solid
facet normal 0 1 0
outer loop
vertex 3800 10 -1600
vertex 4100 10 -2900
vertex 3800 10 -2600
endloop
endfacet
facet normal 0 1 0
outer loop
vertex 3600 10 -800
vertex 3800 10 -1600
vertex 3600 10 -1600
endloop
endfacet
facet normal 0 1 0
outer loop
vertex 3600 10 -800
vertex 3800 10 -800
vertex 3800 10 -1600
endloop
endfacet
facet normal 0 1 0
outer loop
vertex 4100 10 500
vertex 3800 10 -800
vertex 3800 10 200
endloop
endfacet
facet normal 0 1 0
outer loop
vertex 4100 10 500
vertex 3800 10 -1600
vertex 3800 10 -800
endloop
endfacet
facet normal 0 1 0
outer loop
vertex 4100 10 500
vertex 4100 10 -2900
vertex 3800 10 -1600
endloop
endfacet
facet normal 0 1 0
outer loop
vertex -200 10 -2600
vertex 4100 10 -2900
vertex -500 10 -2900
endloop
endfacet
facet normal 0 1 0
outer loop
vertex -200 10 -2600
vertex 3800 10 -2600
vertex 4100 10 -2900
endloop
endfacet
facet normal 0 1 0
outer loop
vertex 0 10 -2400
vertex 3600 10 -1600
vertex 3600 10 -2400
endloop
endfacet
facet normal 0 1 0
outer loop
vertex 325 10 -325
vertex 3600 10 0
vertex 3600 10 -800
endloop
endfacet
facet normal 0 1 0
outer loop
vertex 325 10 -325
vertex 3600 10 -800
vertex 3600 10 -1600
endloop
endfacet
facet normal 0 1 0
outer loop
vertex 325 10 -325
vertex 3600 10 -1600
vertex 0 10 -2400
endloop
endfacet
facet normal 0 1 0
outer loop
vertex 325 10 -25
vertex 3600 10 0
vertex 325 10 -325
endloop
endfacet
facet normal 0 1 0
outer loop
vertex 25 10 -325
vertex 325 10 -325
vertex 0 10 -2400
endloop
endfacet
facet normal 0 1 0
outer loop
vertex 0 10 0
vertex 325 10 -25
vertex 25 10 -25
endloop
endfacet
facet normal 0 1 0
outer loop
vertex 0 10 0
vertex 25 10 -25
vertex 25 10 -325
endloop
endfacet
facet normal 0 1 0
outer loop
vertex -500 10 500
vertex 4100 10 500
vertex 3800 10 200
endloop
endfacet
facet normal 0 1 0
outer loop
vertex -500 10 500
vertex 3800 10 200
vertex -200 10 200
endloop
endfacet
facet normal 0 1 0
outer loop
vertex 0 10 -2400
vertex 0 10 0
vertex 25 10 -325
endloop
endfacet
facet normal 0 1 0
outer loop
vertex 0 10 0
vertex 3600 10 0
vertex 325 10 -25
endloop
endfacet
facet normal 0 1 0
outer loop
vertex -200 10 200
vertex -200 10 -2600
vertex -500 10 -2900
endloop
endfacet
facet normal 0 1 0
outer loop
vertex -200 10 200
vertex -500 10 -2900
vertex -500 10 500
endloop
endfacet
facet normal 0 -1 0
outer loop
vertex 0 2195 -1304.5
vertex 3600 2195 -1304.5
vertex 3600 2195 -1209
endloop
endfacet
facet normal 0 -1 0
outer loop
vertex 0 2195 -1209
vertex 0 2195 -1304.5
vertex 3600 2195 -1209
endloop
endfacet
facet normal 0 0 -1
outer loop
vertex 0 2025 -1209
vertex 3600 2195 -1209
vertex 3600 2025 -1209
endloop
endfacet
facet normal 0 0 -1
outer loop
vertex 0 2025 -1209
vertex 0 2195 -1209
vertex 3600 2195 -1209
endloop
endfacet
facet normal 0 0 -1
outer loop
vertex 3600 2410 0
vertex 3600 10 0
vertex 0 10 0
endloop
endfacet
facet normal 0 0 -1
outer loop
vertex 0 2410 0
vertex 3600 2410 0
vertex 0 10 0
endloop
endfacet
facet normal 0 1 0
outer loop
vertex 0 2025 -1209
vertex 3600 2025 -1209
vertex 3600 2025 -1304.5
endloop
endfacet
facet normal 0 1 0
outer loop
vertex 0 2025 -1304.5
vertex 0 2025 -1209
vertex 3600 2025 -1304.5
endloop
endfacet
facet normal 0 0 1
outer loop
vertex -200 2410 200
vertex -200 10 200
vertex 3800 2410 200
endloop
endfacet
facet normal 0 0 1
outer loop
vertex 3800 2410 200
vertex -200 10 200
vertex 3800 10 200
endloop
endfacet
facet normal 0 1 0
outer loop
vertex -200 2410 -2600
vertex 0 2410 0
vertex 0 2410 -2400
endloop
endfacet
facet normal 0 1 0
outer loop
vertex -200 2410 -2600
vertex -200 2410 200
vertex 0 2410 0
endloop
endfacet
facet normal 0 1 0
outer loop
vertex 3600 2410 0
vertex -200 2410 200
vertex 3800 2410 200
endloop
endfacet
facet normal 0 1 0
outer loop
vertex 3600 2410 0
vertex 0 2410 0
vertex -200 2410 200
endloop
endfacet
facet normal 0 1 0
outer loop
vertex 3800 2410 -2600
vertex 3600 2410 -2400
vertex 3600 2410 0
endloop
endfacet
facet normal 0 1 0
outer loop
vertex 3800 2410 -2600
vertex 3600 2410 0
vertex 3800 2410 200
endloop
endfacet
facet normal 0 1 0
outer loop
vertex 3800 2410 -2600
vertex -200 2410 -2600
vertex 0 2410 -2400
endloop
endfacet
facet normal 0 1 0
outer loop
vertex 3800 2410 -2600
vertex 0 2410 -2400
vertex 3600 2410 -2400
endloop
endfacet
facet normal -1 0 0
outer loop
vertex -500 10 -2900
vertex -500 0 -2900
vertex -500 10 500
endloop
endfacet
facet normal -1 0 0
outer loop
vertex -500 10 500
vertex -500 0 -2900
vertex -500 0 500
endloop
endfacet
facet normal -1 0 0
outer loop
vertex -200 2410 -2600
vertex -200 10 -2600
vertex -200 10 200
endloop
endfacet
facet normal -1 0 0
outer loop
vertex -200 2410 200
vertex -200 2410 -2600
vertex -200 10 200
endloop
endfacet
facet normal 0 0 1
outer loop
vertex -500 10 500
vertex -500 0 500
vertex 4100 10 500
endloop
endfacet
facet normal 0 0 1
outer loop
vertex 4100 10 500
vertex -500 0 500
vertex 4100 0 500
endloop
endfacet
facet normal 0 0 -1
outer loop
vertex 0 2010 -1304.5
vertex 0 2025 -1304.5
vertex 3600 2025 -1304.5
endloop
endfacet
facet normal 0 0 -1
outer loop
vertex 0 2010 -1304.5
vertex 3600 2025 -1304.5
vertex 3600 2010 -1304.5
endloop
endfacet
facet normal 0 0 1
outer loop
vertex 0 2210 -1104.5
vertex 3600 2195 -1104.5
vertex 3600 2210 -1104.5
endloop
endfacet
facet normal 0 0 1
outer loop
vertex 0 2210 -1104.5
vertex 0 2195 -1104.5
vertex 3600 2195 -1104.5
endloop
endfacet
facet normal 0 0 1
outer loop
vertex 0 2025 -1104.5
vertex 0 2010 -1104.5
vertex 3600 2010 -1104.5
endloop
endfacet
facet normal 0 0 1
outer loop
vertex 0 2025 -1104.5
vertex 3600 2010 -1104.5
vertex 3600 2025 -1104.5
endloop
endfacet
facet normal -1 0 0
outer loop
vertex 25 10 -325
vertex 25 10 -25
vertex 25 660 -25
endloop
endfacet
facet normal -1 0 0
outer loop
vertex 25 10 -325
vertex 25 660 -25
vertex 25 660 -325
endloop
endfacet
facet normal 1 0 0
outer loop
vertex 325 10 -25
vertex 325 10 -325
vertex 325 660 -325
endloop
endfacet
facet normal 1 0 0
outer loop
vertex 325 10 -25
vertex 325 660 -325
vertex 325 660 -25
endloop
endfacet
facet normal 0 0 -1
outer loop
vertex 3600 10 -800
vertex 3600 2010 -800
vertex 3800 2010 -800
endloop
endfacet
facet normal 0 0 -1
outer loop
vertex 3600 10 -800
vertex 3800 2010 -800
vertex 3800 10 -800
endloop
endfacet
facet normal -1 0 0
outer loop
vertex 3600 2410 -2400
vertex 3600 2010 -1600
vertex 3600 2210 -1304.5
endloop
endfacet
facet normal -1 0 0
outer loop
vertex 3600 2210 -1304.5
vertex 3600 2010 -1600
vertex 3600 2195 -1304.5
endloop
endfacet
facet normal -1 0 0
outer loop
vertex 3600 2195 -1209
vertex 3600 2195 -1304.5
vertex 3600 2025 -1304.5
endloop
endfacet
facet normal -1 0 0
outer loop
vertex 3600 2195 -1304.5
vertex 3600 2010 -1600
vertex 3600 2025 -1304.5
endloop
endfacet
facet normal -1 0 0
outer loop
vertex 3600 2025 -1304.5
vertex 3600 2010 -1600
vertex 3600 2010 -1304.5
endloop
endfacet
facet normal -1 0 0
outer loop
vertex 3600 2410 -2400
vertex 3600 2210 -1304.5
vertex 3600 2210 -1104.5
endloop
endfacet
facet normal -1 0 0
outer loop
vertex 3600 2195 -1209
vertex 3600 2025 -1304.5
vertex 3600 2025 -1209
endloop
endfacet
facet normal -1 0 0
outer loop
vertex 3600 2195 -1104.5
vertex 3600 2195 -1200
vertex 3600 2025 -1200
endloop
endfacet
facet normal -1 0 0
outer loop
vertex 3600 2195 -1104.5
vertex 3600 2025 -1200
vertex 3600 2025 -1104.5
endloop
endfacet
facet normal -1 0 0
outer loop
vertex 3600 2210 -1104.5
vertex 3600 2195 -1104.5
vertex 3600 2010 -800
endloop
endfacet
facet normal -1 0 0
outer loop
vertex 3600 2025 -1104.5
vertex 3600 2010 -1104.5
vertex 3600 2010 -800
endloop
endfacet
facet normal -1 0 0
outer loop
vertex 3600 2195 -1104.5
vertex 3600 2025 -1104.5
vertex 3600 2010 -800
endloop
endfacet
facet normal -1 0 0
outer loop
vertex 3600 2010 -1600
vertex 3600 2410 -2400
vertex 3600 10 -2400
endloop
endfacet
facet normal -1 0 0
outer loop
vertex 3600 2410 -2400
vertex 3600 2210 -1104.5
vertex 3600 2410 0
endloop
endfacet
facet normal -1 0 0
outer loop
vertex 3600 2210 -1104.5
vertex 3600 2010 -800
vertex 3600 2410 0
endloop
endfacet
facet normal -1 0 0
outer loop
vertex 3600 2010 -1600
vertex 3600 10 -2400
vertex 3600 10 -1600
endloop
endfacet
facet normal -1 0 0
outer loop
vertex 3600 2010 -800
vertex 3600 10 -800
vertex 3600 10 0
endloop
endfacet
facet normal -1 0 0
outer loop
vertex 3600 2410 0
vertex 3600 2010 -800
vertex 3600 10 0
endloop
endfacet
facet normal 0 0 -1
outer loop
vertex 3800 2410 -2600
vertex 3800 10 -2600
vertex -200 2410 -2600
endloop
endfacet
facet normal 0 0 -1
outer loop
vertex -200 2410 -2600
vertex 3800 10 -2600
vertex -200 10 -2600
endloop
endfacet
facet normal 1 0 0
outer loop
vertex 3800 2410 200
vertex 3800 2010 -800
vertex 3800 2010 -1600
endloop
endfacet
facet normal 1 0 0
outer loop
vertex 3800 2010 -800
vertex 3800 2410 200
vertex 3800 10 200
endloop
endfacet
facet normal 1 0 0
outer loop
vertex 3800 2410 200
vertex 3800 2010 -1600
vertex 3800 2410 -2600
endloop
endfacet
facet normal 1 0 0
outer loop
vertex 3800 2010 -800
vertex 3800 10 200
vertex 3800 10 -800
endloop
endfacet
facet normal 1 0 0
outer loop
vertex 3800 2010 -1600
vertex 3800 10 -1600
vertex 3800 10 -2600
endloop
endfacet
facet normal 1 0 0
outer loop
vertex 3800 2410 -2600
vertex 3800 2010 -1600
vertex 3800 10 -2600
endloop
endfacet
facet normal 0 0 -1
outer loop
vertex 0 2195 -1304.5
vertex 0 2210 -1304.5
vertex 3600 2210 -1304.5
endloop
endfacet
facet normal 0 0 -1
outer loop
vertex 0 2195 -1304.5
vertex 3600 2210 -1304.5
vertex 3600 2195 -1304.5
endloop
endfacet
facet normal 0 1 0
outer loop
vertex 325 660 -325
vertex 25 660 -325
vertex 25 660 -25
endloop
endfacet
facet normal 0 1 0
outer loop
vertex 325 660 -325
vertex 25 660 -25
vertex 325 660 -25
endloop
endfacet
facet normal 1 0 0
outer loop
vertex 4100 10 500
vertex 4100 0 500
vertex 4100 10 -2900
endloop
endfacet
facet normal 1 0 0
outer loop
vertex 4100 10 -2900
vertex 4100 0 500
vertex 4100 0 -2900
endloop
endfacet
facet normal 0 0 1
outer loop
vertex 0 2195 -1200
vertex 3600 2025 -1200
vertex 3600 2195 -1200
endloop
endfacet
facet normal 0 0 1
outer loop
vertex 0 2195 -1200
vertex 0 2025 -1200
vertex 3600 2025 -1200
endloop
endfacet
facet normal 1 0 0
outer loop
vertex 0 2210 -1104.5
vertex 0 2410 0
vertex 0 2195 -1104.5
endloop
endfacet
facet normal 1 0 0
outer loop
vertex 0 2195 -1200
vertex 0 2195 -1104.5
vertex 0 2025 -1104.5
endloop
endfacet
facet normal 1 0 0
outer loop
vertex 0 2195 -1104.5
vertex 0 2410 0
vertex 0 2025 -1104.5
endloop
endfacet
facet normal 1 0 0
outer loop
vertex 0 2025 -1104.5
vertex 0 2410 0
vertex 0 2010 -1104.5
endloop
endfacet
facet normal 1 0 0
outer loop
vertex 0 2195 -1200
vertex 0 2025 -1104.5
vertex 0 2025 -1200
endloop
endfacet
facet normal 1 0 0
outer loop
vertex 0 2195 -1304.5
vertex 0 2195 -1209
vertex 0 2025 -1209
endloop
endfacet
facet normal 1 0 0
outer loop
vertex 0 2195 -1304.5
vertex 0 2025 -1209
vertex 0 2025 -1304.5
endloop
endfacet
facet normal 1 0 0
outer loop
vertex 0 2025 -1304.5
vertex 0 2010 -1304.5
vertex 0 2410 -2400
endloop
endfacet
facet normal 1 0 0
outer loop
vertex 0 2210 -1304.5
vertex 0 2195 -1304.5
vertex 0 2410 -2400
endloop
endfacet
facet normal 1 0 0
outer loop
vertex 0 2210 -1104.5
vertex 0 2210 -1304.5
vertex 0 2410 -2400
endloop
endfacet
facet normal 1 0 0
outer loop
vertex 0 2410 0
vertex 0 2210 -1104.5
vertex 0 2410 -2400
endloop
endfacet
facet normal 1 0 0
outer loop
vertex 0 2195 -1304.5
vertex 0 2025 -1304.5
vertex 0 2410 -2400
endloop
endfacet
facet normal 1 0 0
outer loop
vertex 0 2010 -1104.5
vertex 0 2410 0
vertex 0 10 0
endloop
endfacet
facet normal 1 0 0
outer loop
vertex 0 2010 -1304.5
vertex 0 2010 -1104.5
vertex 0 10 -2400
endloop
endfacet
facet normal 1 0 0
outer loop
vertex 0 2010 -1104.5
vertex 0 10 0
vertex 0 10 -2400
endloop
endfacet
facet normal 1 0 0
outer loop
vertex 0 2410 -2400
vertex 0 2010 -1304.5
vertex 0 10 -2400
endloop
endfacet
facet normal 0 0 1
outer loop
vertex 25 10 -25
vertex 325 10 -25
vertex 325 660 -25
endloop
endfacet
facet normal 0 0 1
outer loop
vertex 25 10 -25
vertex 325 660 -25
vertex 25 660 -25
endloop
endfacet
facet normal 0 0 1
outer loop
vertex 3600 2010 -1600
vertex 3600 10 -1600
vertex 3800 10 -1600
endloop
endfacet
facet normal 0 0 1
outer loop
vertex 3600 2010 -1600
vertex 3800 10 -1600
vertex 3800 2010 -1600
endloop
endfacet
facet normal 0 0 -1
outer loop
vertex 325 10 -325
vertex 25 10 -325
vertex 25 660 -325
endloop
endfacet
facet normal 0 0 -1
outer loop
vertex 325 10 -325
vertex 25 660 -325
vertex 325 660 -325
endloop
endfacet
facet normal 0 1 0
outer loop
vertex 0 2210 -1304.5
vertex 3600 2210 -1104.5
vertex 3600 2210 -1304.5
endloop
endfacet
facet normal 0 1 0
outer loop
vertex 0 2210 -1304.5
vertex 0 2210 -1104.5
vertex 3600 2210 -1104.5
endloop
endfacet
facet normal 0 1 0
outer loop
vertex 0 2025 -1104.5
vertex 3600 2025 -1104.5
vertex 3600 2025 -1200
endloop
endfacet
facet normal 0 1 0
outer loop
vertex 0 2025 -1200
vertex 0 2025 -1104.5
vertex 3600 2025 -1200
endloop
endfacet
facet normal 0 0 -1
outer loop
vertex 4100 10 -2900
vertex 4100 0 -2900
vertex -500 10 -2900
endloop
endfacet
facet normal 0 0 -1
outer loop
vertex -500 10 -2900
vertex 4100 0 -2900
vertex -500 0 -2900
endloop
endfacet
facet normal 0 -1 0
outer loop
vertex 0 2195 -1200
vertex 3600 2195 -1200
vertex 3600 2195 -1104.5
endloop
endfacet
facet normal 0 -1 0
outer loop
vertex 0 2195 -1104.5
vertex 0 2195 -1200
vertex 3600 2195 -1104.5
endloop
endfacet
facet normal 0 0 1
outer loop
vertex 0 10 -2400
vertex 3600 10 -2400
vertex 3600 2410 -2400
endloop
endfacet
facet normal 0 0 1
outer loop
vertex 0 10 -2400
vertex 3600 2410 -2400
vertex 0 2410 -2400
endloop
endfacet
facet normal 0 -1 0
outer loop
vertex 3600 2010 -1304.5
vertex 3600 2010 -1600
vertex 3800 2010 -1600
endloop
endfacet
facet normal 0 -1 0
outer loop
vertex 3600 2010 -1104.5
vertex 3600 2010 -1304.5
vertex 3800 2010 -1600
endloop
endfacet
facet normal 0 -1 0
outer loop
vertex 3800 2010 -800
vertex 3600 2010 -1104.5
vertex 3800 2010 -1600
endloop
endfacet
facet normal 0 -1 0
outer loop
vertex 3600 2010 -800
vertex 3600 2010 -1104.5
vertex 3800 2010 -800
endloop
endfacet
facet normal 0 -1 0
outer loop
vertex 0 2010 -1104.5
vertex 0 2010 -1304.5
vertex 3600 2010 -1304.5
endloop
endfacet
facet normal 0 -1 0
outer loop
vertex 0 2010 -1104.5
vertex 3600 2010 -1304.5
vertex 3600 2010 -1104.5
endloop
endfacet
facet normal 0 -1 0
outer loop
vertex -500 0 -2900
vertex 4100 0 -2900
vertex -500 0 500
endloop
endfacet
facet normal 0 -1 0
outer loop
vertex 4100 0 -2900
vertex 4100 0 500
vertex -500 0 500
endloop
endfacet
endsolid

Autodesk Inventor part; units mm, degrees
ref_plane "YZ Plane" through (0, 0, 0) normal (1, 0, 0) x (0, 1, 0)
ref_plane "XZ Plane" through (0, 0, 0) normal (0, 1, 0) x (-1, 0, 0)
ref_plane "XY Plane" through (0, 0, 0) normal (0, 0, 1) x (1, 0, 0)
sketch "Sketch1" plane through (0, 0, 0) normal (0, 1, 0) x (-1, 0, 0)
  line L0 (500, 500) -> (-4100, 500)
  line L1 (-4100, 500) -> (-4100, -2900)
  line L2 (-4100, -2900) -> (500, -2900)
  line L3 (500, -2900) -> (500, 500)
  point P0 (0, 0)
  dimension "d0" = 4600
  dimension "d1" = 500
  dimension "d2" = 500
  dimension "d3" = 3400
extrude "Extrusion1" add sketch "Sketch1" along normal blind 10
sketch "Sketch2" plane through (0, 10, 0) normal (0, 1, 0) x (1, 0, 0)
  line L0 (-500, -500) -> (4100, -500) projected
  line L1 (-500, 2900) -> (-500, -500) projected
  line L2 (-200, -200) -> (0, -200)
  line L3 (0, -200) -> (0, 2600)
  line L4 (0, 2600) -> (-200, 2600)
  line L5 (-200, 2600) -> (-200, -200)
  point P0 (0, 0)
  dimension "d6" = 300
  dimension "d7" = 2800
  dimension "d8" = 200
  dimension "d9" = 300
extrude "Extrusion2" add sketch "Sketch2" along normal blind 2400
sketch "Sketch3" plane through (0, 10, 0) normal (0, 1, 0) x (1, 0, 0)
  line L0 (0, 2600) -> (0, -200) projected
  line L1 (-500, -500) -> (4100, -500) projected
  line L2 (0, -200) -> (3600, -200)
  line L3 (3600, -200) -> (3600, 0)
  line L4 (3600, 0) -> (0, 0)
  line L5 (0, 0) -> (0, -200)
  point P0 (0, 0)
  dimension "d12" = 300
  dimension "d13" = 200
  dimension "d14" = 3600
extrude "Extrusion3" add sketch "Sketch3" along normal blind 2400
sketch "Sketch4" plane through (0, 10, 0) normal (0, 1, 0) x (1, 0, 0)
  line L0 (4100, 2900) -> (-500, 2900) projected
  line L1 (0, 2600) -> (0, 0) projected
  line L2 (0, 2600) -> (3600, 2600)
  line L3 (3600, 2600) -> (3600, 2400)
  line L4 (3600, 2400) -> (0, 2400)
  line L5 (0, 2400) -> (0, 2600)
  dimension "d17" = 300
  dimension "d18" = 200
  dimension "d19" = 3600
extrude "Extrusion4" add sketch "Sketch4" along normal blind 2400
sketch "Sketch5" plane through (0, 10, 0) normal (0, 1, 0) x (1, 0, 0)
  line L0 (3600, -200) -> (3800, -200)
  line L1 (3800, -200) -> (3800, 2600)
  line L2 (3800, 2600) -> (3600, 2600)
  line L3 (3600, 2600) -> (3600, -200)
  dimension "d22" = 200
  dimension "d24" = 2800
extrude "Extrusion5" add sketch "Sketch5" along normal blind 2400
sketch "Sketch6" plane through (3800, 10, 200) normal (1, 0, 0) x (0, 0, -1)
  line L0 (2800, 0) -> (0, 0) projected
  line L1 (2800, 0) -> (2800, 2400) projected
  line L2 (1000, 0) -> (1800, 0)
  line L3 (1800, 0) -> (1800, 2000)
  line L4 (1800, 2000) -> (1000, 2000)
  line L5 (1000, 2000) -> (1000, 0)
  point P0 (200, -10)
  dimension "d27" = 800
  dimension "d29" = 2000
  dimension "d30" = 1000
extrude "Extrusion6" cut sketch "Sketch6" along normal blind 100 and the other way blind 300
sketch "Sketch8" plane through (0, 10, 0) normal (1, 0, 0) x (0, 0, -1)
  line L0 (0, 2400) -> (0, 0) projected
  line L1 (2400, 0) -> (0, 0) projected
  line L2 (1200, 2185) -> (1209, 2185)
  line L3 (1209, 2185) -> (1209, 2015)
  line L4 (1209, 2015) -> (1200, 2015)
  line L5 (1200, 2015) -> (1200, 2185)
  line L6 (1104.5, 2200) -> (1304.5, 2200)
  line L7 (1304.5, 2200) -> (1304.5, 2185)
  line L8 (1304.5, 2185) -> (1104.5, 2185)
  line L9 (1104.5, 2185) -> (1104.5, 2200)
  line L10 (1104.5, 2015) -> (1304.5, 2015)
  line L11 (1304.5, 2015) -> (1304.5, 2000)
  line L12 (1304.5, 2000) -> (1104.5, 2000)
  line L13 (1104.5, 2000) -> (1104.5, 2015)
  point P0 (0, -10)
  dimension "d35" = 9
  dimension "d37" = 1200
  dimension "d38" = 170
  dimension "d39" = 2015
  dimension "d40" = 95.5
  dimension "d41" = 95.5
  dimension "d42" = 15
  dimension "d43" = 15
  dimension "d44" = 0
  dimension "d45" = 200
extrude "Extrusion7" add sketch "Sketch8" along normal blind 3600
sketch "Sketch9" plane through (0, 10, 0) normal (0, 1, 0) x (1, 0, 0)
  line L0 (0, 2400) -> (0, 0) projected
  line L1 (0, 0) -> (3600, 0) projected
  line L2 (25, 325) -> (325, 325)
  line L3 (325, 325) -> (325, 25)
  line L4 (325, 25) -> (25, 25)
  line L5 (25, 25) -> (25, 325)
  dimension "d48" = 25
  dimension "d49" = 25
  dimension "d50" = 300
  dimension "d51" = 300
extrude "Extrusion8" add sketch "Sketch9" along normal blind 650
properties part number "SP_AST_Compartment_Drawing"
